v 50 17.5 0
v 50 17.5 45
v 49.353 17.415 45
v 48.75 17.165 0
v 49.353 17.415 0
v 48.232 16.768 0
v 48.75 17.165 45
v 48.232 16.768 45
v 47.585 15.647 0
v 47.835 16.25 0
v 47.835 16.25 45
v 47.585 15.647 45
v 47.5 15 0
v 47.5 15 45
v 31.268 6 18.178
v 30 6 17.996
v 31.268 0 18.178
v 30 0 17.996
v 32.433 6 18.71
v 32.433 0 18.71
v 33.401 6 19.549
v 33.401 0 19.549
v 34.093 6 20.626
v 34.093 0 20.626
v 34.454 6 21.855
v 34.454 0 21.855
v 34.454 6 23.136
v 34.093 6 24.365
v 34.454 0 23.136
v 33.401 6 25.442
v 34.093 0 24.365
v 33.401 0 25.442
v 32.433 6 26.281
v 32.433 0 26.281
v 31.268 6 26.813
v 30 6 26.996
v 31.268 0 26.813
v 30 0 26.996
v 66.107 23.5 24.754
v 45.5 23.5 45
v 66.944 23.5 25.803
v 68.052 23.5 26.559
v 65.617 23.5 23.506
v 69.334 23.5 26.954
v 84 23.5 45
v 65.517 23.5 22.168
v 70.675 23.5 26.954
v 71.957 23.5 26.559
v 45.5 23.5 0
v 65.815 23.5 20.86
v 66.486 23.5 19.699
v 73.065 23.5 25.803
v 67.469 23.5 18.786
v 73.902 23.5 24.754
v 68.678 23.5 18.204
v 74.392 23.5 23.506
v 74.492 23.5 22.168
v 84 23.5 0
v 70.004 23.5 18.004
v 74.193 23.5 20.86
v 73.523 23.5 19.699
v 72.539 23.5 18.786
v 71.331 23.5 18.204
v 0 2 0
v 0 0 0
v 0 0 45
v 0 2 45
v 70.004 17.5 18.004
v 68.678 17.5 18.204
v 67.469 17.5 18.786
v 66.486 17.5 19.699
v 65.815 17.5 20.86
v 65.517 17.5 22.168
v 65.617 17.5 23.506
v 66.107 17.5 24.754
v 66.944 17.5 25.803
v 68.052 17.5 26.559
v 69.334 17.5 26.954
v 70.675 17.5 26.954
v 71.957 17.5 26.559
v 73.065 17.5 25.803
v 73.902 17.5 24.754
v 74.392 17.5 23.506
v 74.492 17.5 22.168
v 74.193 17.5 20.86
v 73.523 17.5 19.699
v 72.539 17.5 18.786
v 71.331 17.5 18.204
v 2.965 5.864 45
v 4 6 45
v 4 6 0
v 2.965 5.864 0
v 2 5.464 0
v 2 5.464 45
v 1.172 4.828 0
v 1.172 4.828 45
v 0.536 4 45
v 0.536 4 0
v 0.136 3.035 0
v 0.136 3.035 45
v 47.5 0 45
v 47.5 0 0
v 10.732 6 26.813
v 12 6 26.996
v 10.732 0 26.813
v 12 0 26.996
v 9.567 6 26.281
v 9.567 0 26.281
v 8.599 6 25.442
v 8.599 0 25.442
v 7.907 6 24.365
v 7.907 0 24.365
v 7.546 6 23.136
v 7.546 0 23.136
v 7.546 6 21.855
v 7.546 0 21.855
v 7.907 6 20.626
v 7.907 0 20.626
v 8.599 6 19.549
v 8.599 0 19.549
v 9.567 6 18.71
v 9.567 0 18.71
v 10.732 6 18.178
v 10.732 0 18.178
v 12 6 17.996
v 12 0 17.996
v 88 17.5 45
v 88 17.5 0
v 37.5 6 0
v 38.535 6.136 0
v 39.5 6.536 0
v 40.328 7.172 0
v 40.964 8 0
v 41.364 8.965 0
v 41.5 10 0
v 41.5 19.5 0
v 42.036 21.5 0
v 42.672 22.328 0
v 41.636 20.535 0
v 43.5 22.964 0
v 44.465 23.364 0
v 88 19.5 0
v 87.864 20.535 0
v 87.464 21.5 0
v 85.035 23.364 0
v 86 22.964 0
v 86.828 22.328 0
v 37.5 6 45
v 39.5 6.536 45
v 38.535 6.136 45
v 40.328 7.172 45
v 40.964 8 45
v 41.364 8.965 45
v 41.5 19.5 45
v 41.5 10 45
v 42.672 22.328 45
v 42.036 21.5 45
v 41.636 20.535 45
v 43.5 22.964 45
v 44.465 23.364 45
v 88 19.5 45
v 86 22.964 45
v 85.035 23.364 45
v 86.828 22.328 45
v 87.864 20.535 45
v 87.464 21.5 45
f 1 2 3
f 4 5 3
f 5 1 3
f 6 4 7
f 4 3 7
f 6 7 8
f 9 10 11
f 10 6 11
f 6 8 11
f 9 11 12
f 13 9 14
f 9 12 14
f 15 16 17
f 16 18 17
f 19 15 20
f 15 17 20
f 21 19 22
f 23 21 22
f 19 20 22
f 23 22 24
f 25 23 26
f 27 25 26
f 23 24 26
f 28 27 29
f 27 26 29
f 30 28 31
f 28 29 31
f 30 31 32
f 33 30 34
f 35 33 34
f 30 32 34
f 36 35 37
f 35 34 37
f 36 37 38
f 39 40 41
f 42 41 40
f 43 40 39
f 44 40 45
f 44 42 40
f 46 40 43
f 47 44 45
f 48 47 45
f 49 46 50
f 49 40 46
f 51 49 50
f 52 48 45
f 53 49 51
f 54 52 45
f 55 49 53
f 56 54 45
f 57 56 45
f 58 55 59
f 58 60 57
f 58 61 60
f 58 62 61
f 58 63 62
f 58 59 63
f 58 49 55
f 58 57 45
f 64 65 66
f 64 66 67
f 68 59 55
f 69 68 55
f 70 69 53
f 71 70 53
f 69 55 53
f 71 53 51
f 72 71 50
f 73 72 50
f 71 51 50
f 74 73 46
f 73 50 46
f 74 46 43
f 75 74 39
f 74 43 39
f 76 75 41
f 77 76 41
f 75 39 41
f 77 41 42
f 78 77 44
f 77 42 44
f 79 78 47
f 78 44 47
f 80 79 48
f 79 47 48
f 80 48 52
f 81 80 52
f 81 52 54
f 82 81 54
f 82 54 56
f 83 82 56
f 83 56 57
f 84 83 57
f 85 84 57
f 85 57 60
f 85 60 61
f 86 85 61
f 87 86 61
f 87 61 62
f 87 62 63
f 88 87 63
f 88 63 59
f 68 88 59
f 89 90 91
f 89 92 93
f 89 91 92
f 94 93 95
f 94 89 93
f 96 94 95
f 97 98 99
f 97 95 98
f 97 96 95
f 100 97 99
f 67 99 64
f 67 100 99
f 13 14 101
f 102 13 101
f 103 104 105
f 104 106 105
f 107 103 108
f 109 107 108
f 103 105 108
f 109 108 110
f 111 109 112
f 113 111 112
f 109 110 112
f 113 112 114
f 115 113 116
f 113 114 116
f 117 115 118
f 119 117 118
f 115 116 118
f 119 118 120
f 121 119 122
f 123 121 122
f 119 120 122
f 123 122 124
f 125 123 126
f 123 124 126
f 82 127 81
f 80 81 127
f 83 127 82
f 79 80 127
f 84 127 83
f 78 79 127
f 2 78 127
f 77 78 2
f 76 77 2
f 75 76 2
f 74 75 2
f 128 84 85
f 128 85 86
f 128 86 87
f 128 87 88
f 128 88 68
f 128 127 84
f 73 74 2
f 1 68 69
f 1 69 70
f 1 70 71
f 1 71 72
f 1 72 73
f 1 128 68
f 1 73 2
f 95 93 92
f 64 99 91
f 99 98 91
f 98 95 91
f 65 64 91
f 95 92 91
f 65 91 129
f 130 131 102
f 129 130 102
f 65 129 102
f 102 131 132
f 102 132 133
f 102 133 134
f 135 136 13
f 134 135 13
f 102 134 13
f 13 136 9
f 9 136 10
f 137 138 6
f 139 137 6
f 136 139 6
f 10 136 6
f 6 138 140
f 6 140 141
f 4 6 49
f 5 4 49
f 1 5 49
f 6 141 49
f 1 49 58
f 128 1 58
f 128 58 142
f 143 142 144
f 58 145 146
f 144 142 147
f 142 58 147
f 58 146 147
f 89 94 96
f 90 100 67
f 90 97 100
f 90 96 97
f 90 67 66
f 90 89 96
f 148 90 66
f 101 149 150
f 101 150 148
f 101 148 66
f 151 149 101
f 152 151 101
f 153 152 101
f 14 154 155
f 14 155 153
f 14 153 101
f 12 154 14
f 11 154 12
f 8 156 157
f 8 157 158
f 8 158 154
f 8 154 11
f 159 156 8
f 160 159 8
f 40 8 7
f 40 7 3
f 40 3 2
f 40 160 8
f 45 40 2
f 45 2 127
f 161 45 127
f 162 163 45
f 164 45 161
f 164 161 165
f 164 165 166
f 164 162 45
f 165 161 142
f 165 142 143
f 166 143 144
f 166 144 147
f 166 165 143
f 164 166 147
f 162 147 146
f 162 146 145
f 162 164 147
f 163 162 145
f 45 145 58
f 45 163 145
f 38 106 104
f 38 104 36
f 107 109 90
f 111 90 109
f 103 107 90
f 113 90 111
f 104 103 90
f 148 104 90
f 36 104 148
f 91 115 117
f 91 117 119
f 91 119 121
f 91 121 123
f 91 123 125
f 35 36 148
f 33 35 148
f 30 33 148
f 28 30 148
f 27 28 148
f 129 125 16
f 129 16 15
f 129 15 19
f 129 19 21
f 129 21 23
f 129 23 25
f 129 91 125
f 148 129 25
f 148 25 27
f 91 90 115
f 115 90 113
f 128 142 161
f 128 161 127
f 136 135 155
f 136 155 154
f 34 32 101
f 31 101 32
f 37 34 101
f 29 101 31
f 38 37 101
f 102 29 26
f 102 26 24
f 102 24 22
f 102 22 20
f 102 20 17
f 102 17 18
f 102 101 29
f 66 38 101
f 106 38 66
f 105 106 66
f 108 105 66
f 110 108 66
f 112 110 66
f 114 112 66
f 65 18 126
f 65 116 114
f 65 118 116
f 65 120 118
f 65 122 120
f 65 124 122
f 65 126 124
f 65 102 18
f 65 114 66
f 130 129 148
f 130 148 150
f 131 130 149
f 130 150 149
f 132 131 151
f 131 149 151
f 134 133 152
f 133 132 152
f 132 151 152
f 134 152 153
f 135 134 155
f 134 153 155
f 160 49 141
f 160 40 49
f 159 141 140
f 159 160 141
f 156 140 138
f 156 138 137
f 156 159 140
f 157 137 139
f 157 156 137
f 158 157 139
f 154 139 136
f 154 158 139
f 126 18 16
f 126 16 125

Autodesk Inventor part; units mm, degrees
ref_plane "YZ Plane" through (0, 0, 0) normal (1, 0, 0) x (0, 1, 0)
ref_plane "XZ Plane" through (0, 0, 0) normal (0, 1, 0) x (-1, 0, 0)
ref_plane "XY Plane" through (0, 0, 0) normal (0, 0, 1) x (1, 0, 0)
sketch "Sketch1" plane through (0, 0, 0) normal (0, 0, 1) x (1, 0, 0)
  line L0 (0, 0) -> (0, 6)
  line L1 (0, 6) -> (41.5, 6)
  line L2 (41.5, 6) -> (41.5, 23.5)
  line L3 (41.5, 23.5) -> (88, 23.5)
  line L4 (88, 23.5) -> (88, 17.5)
  line L5 (88, 17.5) -> (47.5, 17.5)
  line L6 (47.5, 17.5) -> (47.5, 0)
  line L7 (47.5, 0) -> (0, 0)
  dimension "d0" = 6
  dimension "d1" = 6
  dimension "d2" = 6
  dimension "d3" = 88
  dimension "d4" = 41.5
  dimension "d5" = 17.5
extrude "Extrusion1" add sketch "Sketch1" along normal blind 45
sketch "Sketch3" plane through (88, 17.5, 0) normal (0, -1, 0) x (1, 0, 0)
  line L0 (0, 0) -> (-40.5, 0) projected
  line L1 (-40.5, 0) -> (-40.5, 45) projected
  point P0 (-38, 0)
  point P1 (-88, 0)
  point P2 (-17.9956, 22.5044)
  dimension "d9" = 22.5044
  dimension "d10" = 22.5044
hole "Hole1" at (70.0044, 17.5, 22.5044) direction (0, 1, 0) diameter 9 end through all
sketch "Sketch4" plane through (0, 0, 0) normal (0, -1, 0) x (1, 0, 0)
  line L0 (47.5, 45) -> (0, 45) projected
  line L1 (47.5, 0) -> (47.5, 45) projected
  circle A0 centre (30, 22.4956) radius 4.5
  circle A1 centre (12, 22.4956) radius 4.5
  line L2 (30, 17.9956) -> (12, 17.9956)
  line L3 (12, 26.9956) -> (30, 26.9956)
  dimension "d18" = 17.5
  dimension "d19" = 18
  dimension "d20" = 22.5044
  dimension "d21" = 9
  dimension "d22" = 9
extrude "Extrusion2" cut sketch "Sketch4" against normal blind 45
fillet "Fillet2" radius 2.5 1 edges at (47.5, 17.5, 22.5)
fillet "Fillet3" radius 4 4 edges at (88, 23.5, 22.5) (41.5, 23.5, 22.5) (0, 6, 22.5) (41.5, 6, 22.5)
equation "\"d1\" = d0"
equation "\"d2\" = d0"
equation "\"d22\" = d21"
properties part number "093P45LN Bracket" material "Aluminum-6061"
